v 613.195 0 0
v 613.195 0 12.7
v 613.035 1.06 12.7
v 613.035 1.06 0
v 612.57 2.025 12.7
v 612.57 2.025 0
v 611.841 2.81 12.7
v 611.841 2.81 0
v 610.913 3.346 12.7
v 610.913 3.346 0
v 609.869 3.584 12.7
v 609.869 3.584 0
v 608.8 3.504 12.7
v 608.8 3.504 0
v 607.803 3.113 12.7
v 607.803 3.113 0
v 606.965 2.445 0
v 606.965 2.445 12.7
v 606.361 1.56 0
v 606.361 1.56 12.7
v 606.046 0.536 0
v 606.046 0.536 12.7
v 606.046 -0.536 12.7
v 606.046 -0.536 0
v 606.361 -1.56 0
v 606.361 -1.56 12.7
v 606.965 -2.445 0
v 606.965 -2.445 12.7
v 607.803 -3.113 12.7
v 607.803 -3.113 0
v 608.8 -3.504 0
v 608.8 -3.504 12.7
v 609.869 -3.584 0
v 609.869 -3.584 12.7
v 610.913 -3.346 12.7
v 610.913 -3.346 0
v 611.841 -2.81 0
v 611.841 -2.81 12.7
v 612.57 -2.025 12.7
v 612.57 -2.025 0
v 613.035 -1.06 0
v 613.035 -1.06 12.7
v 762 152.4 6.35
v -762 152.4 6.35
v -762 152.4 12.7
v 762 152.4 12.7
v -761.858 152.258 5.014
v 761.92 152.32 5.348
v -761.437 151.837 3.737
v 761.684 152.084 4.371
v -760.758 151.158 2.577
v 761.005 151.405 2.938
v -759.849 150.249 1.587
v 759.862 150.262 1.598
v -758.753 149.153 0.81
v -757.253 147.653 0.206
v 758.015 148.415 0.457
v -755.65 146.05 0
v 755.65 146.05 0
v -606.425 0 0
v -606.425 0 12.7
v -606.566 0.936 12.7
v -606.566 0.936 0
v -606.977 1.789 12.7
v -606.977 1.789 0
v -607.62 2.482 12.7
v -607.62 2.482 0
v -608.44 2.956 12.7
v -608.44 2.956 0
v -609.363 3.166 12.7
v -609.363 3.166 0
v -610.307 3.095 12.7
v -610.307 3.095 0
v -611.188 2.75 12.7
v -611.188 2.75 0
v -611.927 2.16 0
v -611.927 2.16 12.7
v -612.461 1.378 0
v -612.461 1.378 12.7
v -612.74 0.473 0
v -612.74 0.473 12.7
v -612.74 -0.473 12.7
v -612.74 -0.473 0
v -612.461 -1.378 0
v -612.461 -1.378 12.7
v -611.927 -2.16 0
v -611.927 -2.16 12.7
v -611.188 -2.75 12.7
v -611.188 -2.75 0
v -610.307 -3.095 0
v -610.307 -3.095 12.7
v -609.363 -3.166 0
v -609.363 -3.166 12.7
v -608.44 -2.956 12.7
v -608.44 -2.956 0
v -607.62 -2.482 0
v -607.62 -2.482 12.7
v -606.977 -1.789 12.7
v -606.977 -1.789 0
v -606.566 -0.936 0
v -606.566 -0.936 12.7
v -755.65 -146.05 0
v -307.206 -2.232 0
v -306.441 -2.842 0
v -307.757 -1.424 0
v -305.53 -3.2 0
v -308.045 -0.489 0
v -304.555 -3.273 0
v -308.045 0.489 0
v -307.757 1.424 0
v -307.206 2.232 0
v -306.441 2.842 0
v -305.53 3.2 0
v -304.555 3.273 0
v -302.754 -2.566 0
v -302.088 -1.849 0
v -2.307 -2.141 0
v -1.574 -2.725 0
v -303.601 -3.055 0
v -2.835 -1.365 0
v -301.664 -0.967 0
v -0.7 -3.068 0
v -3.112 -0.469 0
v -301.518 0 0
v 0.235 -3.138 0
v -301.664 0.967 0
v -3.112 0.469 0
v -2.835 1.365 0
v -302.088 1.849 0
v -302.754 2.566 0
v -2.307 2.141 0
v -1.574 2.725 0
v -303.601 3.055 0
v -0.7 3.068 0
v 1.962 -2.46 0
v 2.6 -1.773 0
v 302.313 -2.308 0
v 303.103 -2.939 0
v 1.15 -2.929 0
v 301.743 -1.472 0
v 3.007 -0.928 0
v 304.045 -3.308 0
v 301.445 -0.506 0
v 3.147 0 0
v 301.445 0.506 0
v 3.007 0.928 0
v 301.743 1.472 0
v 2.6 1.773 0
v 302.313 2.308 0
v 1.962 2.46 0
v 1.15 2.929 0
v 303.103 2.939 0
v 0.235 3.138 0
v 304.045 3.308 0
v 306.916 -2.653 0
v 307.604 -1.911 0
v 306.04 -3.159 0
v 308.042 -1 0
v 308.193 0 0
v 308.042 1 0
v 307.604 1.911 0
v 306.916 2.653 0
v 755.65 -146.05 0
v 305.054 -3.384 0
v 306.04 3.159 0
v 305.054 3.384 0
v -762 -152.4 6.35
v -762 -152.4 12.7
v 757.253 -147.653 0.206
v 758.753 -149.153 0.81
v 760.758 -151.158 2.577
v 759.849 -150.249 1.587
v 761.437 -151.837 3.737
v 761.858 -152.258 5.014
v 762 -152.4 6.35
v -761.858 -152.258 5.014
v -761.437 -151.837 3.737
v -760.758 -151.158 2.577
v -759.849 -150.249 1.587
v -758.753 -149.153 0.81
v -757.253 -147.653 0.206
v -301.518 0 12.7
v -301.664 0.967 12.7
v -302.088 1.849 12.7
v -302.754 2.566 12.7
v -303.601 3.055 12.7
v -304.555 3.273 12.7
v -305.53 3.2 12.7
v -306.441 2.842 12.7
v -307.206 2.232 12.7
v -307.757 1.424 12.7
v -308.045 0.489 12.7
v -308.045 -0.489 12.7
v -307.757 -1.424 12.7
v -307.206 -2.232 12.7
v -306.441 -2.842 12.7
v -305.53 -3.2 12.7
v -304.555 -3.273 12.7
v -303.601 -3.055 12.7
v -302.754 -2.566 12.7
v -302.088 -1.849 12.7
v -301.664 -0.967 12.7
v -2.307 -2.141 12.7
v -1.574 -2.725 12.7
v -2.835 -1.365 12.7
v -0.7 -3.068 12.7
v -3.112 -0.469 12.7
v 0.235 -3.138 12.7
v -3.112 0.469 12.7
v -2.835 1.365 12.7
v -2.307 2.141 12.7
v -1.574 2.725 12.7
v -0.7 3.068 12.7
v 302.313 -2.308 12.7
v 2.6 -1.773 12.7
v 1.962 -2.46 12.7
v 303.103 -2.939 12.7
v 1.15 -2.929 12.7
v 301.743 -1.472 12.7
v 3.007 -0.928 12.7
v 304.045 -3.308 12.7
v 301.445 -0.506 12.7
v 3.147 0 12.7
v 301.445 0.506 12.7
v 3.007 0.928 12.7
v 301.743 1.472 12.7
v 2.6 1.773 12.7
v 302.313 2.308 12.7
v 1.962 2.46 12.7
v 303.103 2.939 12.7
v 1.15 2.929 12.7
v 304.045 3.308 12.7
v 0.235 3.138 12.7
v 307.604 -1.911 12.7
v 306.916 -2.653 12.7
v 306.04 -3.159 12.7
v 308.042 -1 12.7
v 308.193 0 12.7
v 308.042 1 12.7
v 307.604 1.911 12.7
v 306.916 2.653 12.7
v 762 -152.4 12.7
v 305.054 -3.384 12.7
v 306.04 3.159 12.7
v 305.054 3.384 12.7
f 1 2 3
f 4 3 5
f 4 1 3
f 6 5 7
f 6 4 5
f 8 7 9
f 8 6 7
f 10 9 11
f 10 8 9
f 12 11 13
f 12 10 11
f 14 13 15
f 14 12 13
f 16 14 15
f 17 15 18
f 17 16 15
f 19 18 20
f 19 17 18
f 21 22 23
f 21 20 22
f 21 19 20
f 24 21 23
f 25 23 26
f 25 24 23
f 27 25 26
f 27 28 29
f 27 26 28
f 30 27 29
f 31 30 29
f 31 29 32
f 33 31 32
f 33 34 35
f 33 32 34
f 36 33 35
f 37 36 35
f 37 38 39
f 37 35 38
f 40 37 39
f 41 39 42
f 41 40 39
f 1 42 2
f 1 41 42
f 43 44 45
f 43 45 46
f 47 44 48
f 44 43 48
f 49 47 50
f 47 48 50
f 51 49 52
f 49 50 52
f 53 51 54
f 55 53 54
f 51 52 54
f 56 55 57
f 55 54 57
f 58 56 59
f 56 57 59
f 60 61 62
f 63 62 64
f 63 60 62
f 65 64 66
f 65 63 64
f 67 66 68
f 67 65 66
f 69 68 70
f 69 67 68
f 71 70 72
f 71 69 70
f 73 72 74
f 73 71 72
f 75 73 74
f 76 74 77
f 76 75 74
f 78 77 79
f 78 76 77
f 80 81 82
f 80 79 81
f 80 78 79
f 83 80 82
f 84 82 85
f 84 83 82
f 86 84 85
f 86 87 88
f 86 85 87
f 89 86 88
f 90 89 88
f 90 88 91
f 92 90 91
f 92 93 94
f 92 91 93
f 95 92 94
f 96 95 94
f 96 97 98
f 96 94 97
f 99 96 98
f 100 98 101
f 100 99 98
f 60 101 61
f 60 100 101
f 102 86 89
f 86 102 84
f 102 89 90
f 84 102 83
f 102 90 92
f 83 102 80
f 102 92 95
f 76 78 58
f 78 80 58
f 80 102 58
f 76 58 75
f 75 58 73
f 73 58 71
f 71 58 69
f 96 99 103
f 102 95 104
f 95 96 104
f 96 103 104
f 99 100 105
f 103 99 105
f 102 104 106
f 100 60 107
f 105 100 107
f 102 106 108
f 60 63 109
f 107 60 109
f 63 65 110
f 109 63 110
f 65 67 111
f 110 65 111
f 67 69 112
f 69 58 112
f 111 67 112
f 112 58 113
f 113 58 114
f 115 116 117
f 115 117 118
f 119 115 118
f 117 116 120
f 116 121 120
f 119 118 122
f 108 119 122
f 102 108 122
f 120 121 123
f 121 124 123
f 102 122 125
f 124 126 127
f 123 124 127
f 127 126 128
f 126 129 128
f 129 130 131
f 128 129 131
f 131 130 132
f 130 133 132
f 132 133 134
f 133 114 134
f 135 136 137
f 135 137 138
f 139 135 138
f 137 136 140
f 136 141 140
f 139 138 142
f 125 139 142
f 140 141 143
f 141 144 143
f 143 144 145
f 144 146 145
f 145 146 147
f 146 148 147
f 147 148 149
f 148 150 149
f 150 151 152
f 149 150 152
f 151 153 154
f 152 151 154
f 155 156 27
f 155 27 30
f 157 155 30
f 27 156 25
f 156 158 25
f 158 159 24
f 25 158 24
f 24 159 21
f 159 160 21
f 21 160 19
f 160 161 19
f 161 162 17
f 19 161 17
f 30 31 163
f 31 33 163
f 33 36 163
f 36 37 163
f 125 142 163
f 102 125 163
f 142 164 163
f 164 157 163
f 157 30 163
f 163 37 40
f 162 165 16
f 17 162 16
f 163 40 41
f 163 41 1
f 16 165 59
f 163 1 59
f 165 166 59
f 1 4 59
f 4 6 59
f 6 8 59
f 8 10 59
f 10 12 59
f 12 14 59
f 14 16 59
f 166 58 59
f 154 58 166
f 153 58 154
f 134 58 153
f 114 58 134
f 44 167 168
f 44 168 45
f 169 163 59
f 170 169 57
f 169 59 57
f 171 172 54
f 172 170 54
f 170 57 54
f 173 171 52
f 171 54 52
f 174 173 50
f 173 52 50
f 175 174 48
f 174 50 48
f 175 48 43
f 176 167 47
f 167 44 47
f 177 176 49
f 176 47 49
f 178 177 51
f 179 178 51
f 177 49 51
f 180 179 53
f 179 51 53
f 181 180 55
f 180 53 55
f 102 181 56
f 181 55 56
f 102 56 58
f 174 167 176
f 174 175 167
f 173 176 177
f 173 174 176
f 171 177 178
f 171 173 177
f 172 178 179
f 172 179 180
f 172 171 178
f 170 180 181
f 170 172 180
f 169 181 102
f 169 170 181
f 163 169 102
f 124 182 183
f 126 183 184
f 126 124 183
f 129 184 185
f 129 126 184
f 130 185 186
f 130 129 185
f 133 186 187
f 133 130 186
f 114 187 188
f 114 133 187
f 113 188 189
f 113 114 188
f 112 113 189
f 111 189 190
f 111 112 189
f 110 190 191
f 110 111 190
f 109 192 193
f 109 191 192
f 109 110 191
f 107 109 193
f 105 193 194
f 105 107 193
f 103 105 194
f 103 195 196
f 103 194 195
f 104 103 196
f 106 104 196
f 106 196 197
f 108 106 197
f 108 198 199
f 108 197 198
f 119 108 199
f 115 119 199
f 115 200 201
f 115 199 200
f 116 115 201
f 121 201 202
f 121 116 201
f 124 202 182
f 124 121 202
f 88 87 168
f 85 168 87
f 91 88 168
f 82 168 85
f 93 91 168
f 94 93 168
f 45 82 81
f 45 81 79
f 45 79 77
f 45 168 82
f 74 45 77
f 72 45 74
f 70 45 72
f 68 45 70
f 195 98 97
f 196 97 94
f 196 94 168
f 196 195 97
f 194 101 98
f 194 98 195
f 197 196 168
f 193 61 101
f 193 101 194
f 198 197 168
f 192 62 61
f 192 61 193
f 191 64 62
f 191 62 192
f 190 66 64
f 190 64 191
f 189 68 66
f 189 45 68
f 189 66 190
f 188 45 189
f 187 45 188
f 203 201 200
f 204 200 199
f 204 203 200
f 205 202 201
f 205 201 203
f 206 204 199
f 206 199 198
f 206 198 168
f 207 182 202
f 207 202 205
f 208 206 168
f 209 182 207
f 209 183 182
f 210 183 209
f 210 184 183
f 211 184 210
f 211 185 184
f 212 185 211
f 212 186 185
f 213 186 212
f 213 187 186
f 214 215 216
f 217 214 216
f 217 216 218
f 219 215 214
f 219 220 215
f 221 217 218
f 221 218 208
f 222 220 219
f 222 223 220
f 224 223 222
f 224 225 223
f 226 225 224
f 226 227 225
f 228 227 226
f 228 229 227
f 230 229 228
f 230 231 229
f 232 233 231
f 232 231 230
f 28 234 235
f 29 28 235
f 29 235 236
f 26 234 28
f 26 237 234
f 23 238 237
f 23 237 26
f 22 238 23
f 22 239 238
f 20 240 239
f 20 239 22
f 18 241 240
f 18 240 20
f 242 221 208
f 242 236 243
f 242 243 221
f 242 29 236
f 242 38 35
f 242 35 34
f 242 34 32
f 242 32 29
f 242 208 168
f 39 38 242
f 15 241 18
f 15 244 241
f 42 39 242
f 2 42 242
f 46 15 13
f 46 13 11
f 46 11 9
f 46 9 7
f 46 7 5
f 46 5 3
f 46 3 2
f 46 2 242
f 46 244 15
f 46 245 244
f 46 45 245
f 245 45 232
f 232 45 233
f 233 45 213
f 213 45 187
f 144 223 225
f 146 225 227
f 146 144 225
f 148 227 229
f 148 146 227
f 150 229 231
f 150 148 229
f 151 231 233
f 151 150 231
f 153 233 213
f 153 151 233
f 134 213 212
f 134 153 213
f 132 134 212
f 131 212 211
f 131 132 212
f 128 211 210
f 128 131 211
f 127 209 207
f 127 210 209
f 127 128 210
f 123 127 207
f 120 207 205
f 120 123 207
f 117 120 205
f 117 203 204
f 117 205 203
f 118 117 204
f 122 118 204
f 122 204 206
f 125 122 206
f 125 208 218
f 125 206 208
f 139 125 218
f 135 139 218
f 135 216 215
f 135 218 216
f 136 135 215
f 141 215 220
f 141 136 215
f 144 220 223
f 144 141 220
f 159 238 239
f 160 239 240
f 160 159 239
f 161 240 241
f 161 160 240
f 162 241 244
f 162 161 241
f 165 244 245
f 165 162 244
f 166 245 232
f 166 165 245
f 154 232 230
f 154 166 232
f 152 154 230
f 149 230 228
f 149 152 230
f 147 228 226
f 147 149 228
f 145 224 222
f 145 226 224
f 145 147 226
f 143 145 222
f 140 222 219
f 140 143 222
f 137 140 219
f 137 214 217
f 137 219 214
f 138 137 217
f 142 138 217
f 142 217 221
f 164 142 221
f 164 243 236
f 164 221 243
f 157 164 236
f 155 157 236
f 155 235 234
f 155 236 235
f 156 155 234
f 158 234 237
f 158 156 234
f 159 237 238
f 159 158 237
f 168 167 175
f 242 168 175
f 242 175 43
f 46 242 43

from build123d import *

# Parameters (mm, degrees)
F0_W          = 1524
F0_H          = 304.8
F2_DEPTH      = 12.7
F1_R          = 3.1470051967
F1_R_2        = 3.3931415127
F1_R_3        = 3.5945394666
F1_R_4        = 3.2819860345
F1_R_5        = 3.175
F3_DEPTH      = 25.4
F3_DEPTH_BACK = 25.4
F4_R          = 6.35


with BuildPart() as f2:
    # F0 (on Top) → F2 (new body)
    with BuildSketch(Plane.XY):
        Rectangle(F0_W, F0_H)
    extrude(amount=F2_DEPTH)

    # F1 (on Top) → F3 (cut, two sides)
    with BuildSketch(Plane.XY) as f3_sk:
        Circle(F1_R)
        with Locations((304.8, 0)):
            Circle(F1_R_2)
        with Locations((609.6, 0)):
            Circle(F1_R_3)
        with Locations((-304.8, 0)):
            Circle(F1_R_4)
        with Locations((-609.6, 0)):
            Circle(F1_R_5)
    extrude(amount=-F3_DEPTH, mode=Mode.SUBTRACT)
    extrude(f3_sk.sketch, amount=F3_DEPTH_BACK, mode=Mode.SUBTRACT)

    # F4
    f4_edges = [f2.edges().sort_by_distance(p)[0] for p in [
        (0, -152.4, 0),
        (762, 0, 0),
        (-762, 0, 0),
        (0, 152.4, 0),
    ]]
    fillet(f4_edges, radius=F4_R)


solid = f2.part
